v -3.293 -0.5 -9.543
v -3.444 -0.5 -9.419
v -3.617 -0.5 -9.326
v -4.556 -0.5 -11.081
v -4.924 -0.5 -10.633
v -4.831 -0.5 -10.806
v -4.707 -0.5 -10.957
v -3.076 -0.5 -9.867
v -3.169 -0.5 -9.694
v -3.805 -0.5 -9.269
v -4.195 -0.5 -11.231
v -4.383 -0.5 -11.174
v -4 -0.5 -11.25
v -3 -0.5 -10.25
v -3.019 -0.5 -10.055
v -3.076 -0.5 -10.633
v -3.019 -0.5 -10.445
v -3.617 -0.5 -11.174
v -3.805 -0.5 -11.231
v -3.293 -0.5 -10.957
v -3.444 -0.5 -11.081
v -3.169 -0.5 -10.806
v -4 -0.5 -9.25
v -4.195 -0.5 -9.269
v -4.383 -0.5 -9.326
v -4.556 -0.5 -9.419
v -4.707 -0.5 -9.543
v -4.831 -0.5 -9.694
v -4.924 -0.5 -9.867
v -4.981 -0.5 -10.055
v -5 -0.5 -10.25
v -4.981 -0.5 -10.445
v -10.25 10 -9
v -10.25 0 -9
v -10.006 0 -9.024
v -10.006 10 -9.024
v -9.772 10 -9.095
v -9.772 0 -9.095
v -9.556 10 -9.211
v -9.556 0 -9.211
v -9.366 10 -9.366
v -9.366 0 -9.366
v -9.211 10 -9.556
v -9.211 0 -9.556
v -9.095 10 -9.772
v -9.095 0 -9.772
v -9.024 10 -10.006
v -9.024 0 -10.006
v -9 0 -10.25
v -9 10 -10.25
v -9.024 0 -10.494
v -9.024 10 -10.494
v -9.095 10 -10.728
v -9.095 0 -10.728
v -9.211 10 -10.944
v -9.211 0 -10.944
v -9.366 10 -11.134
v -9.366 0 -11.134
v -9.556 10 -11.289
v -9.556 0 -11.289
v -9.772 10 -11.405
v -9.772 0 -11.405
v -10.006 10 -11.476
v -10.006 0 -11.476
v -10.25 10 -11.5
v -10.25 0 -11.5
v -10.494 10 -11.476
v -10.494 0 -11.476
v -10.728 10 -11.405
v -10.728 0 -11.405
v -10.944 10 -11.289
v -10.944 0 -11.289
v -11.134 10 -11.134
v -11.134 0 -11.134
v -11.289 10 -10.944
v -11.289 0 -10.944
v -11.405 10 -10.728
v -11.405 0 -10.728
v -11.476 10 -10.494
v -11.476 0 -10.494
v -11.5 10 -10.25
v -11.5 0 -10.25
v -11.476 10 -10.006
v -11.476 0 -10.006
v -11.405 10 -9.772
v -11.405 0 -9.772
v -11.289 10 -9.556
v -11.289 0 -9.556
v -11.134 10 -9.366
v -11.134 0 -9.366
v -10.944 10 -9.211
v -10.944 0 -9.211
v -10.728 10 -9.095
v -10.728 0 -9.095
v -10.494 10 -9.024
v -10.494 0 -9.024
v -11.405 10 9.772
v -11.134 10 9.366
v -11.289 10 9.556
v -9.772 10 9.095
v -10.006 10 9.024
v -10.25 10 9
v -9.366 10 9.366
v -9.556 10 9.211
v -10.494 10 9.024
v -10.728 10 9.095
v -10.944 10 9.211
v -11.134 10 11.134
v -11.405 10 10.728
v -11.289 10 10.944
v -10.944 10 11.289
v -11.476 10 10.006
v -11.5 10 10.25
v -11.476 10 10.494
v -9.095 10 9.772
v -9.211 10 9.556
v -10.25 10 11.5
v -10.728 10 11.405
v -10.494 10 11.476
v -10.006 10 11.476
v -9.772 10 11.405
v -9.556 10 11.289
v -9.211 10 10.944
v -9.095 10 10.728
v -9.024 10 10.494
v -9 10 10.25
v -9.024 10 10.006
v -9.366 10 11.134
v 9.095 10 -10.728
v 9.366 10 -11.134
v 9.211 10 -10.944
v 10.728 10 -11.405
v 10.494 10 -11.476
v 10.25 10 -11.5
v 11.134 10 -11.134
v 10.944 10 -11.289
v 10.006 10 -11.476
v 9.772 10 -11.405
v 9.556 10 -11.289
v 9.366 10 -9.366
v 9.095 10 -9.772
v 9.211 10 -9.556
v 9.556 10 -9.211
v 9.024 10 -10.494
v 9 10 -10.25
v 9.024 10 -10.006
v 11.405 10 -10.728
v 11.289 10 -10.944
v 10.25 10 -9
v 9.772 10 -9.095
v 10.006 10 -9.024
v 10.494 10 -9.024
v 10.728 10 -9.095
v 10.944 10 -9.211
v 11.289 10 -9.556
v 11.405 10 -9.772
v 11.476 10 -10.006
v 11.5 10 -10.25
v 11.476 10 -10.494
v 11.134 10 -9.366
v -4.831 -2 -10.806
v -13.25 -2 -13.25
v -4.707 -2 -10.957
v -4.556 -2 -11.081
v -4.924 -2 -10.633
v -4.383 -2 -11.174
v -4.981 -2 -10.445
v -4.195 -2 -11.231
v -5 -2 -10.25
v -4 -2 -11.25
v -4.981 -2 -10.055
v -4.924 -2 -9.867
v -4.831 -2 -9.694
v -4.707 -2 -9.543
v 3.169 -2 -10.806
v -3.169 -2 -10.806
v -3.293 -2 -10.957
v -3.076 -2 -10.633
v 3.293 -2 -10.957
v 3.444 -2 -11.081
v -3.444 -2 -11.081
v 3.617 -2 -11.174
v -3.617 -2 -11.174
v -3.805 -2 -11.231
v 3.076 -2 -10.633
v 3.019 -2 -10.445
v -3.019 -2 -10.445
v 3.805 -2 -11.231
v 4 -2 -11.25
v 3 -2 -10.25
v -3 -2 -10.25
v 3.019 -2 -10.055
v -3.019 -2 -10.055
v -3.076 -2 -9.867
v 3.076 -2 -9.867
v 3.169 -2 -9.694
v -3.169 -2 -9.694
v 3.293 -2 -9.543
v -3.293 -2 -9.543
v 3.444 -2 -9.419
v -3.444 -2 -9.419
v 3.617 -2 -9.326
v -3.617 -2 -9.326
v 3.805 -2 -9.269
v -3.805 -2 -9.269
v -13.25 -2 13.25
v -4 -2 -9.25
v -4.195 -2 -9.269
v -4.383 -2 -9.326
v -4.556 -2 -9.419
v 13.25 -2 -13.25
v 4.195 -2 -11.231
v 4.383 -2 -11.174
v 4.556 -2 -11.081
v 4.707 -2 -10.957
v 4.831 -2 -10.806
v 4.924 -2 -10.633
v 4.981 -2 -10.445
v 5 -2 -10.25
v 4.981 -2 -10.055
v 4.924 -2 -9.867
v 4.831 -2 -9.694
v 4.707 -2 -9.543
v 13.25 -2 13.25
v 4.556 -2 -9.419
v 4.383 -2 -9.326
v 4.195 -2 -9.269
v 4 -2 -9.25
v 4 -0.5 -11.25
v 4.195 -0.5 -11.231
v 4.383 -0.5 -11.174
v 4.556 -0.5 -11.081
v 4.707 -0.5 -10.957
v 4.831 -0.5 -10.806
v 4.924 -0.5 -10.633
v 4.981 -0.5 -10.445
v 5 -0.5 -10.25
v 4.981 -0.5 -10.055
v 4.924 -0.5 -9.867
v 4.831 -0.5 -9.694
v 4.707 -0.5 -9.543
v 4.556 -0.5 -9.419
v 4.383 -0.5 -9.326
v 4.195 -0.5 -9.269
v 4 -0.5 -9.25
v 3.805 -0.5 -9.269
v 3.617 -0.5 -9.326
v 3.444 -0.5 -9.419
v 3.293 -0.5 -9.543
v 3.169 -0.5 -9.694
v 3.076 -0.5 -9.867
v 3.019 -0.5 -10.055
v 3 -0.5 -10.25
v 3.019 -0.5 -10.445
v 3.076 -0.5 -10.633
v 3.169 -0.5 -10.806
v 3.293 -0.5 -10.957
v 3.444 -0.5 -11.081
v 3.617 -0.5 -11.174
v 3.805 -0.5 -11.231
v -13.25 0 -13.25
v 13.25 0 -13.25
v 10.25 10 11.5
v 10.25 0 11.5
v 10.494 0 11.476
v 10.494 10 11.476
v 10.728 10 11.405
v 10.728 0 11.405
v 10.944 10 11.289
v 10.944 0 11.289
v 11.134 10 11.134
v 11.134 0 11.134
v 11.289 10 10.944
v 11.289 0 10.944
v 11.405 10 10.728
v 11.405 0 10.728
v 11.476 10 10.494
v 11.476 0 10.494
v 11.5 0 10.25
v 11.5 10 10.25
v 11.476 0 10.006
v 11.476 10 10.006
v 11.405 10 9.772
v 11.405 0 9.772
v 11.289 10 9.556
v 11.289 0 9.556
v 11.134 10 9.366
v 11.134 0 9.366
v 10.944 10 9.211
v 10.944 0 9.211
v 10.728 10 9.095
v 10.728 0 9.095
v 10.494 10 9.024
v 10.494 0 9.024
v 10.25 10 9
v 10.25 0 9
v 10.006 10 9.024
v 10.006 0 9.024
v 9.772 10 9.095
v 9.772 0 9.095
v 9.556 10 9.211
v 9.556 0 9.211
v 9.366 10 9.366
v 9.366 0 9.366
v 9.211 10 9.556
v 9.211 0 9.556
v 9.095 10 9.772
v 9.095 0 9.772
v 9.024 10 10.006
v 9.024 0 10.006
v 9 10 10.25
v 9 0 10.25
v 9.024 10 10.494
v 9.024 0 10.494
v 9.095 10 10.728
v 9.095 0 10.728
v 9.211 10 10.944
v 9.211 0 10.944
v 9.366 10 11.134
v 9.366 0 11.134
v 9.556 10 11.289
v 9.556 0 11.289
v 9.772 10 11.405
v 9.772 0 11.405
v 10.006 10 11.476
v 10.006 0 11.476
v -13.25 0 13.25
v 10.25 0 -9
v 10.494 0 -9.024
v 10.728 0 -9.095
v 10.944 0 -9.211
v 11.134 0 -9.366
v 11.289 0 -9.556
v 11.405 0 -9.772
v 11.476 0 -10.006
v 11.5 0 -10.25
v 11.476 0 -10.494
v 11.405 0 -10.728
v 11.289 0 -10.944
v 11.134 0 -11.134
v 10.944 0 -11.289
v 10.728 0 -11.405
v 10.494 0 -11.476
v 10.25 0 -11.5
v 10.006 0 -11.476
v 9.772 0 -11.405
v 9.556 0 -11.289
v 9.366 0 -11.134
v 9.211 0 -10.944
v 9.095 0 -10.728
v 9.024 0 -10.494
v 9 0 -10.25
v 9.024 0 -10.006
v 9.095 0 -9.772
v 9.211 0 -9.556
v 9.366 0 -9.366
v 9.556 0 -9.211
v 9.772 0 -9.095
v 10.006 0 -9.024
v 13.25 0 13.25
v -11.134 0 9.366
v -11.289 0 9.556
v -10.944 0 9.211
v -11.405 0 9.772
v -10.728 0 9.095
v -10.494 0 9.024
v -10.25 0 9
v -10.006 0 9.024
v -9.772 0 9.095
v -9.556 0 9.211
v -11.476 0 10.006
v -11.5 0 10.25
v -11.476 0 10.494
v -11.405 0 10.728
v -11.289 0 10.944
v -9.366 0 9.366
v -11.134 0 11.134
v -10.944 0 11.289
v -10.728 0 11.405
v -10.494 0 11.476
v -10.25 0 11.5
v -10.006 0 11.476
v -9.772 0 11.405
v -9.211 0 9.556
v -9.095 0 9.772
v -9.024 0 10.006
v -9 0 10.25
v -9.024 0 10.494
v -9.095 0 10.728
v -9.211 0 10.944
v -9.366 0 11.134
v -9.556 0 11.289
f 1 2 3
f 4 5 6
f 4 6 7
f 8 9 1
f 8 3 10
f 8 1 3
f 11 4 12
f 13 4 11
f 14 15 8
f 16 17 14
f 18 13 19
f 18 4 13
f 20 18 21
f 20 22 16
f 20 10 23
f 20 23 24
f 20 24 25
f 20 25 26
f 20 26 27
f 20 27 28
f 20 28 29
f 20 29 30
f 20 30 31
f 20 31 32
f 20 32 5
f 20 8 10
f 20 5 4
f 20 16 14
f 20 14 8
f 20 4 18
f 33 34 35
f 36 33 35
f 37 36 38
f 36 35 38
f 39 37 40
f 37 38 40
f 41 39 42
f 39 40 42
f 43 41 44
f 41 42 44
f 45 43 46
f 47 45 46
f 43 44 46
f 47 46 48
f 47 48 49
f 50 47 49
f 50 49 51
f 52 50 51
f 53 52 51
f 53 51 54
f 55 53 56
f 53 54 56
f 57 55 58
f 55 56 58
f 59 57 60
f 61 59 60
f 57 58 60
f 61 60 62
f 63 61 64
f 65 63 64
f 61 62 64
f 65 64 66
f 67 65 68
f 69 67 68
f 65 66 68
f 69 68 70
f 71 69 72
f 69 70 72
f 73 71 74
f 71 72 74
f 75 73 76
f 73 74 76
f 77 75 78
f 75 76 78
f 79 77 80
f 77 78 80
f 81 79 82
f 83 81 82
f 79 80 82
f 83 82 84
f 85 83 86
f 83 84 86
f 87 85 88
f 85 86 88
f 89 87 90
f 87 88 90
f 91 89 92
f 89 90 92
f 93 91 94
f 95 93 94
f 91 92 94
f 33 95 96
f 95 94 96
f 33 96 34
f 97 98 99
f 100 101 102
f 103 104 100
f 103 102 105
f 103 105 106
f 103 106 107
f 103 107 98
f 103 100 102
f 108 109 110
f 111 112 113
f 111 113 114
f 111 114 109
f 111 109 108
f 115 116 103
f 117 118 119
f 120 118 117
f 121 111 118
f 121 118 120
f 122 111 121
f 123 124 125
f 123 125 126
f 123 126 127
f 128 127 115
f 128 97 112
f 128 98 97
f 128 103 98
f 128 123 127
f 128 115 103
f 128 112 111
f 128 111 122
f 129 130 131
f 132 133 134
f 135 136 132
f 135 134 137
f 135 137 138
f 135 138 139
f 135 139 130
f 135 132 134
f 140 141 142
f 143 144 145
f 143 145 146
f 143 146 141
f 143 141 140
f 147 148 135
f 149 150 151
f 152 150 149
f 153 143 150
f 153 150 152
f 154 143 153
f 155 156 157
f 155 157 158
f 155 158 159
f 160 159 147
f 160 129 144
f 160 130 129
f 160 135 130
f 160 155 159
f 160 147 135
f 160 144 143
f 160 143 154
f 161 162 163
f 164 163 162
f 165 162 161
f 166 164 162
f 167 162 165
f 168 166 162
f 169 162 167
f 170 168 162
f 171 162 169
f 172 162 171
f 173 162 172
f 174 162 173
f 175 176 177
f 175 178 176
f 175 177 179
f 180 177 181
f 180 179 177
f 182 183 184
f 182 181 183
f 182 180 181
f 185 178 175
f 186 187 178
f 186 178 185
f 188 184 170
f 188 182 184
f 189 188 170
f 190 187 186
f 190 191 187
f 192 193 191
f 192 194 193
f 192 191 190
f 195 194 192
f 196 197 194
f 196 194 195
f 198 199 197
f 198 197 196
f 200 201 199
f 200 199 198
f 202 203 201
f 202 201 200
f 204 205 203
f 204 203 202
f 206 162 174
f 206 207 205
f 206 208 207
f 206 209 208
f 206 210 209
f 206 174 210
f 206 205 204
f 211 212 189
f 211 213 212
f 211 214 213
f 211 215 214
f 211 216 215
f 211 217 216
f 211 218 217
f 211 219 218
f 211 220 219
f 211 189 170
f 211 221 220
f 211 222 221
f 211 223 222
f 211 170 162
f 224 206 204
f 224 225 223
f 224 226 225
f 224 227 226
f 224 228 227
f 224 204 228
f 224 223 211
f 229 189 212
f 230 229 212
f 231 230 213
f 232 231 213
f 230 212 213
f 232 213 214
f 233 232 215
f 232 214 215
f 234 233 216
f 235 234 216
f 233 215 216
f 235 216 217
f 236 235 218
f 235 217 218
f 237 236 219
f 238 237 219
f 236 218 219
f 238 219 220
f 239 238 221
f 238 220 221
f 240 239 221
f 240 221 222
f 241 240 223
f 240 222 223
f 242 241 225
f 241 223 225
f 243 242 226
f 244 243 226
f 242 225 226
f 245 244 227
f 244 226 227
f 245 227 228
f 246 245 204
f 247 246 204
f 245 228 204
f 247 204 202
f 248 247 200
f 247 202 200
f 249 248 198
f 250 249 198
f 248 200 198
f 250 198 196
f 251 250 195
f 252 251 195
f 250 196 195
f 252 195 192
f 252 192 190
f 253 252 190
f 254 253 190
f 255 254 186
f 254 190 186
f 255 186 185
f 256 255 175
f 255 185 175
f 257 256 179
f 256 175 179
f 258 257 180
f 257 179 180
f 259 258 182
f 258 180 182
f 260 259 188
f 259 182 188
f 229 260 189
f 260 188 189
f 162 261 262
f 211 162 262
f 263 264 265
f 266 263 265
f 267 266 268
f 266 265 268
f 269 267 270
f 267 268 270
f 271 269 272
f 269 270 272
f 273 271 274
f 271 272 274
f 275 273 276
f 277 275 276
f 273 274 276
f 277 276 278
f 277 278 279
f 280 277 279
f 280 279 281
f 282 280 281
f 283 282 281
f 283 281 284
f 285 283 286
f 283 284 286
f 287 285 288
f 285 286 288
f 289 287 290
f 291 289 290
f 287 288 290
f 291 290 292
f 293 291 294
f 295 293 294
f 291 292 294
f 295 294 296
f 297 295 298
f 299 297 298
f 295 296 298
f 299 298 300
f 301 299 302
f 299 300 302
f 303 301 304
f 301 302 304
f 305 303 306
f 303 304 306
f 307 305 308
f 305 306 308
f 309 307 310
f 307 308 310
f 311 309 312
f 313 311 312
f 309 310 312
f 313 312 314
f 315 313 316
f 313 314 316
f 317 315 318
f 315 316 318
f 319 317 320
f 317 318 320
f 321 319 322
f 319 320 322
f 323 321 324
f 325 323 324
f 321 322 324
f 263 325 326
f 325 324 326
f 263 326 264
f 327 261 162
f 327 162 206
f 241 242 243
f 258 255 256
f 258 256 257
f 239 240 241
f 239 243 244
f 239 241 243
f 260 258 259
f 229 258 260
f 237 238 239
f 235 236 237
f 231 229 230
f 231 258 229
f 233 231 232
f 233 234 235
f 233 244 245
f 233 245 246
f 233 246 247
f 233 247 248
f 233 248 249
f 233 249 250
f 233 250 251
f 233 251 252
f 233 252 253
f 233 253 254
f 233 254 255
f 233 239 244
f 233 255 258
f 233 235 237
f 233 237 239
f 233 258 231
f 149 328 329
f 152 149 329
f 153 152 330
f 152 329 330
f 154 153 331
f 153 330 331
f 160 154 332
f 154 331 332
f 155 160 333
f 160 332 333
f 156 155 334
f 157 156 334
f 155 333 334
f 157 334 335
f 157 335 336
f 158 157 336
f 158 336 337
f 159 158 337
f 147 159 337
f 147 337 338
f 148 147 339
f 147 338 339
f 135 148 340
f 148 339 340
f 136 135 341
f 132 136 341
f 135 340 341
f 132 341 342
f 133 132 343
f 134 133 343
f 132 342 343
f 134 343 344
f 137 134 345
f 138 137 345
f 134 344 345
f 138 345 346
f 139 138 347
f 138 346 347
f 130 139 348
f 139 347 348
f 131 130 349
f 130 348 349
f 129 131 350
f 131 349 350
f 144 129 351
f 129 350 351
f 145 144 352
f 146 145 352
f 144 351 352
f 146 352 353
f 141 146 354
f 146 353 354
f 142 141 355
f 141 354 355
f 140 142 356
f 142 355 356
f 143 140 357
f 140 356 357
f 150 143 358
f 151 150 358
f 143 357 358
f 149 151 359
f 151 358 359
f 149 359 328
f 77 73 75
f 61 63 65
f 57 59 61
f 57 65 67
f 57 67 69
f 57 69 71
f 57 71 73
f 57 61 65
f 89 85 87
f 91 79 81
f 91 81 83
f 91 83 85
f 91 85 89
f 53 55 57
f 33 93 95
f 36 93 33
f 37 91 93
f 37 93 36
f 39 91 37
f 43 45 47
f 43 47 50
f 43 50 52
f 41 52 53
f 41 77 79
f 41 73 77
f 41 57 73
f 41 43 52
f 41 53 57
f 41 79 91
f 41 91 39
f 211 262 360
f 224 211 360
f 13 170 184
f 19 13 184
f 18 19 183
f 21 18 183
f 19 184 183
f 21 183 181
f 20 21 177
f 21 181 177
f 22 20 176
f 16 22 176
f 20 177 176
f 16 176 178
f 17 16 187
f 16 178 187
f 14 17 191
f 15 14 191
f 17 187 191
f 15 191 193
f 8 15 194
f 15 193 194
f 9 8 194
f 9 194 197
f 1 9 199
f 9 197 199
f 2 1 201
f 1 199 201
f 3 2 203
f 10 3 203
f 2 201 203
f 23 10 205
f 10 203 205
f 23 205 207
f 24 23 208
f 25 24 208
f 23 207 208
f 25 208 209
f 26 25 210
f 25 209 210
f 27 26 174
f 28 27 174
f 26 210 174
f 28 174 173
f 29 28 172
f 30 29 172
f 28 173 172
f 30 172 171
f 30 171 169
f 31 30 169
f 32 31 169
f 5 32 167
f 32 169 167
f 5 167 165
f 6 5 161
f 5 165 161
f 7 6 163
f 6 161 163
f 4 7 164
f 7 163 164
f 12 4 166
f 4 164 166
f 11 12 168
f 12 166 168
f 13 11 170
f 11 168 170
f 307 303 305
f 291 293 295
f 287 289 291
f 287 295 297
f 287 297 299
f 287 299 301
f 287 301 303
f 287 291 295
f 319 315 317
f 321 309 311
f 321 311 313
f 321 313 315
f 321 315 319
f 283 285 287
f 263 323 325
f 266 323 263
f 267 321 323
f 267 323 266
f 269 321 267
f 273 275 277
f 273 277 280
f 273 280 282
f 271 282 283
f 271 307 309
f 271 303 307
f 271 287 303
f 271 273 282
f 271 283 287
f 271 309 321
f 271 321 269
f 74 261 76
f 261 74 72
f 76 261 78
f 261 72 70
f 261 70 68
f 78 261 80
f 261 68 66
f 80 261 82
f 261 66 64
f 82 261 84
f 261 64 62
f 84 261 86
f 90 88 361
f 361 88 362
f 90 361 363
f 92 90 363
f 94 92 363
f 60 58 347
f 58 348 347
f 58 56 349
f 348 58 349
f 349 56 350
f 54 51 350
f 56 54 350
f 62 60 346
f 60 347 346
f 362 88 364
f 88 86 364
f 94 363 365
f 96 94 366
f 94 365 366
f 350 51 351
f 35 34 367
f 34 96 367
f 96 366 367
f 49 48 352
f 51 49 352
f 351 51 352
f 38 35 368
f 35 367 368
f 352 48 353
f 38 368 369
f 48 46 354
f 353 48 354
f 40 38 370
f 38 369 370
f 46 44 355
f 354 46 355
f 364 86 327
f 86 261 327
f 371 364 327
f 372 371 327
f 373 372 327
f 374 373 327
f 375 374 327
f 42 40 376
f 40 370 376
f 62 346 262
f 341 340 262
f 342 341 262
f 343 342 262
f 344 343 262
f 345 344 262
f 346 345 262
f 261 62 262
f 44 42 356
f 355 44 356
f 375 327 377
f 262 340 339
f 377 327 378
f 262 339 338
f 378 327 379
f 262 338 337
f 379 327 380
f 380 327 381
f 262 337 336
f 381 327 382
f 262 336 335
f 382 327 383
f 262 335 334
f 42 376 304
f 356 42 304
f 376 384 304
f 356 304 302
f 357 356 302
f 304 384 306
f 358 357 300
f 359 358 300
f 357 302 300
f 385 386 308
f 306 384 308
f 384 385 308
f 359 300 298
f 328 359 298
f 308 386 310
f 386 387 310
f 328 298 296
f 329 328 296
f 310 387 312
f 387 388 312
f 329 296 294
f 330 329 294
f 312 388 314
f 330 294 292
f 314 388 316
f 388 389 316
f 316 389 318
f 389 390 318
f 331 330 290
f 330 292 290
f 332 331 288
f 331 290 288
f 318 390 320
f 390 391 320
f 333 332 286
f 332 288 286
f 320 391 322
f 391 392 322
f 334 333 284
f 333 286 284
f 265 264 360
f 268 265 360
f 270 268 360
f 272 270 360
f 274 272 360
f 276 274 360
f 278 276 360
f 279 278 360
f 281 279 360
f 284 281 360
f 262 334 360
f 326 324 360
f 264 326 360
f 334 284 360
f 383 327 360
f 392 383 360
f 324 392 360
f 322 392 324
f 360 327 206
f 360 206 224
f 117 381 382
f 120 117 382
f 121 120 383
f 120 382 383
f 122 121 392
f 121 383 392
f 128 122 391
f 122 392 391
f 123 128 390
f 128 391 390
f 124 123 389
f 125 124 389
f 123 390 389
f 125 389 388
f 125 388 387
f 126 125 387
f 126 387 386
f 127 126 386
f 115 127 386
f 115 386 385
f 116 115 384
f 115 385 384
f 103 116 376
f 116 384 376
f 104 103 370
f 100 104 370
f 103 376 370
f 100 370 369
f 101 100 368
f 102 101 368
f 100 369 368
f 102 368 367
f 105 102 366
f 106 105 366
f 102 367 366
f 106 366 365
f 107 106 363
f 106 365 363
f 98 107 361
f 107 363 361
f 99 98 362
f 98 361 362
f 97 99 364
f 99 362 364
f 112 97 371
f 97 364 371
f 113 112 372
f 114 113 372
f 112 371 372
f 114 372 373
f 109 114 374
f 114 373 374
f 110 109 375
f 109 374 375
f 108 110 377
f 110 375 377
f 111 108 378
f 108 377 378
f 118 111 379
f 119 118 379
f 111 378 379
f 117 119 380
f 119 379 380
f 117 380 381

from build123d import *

# Parameters (mm, degrees)
SKETCH1_R             = 1.25
BOSS_EXTRUDE1_DEPTH   = 10
BOSS_EXTRUDE1_2_DEPTH = 10
BOSS_EXTRUDE1_3_DEPTH = 10
BOSS_EXTRUDE1_4_DEPTH = 10
SKETCH2_W             = 26.5
SKETCH2_H             = 26.5
BOSS_EXTRUDE2_DEPTH   = 2
SKETCH3_R             = 1
CUT_EXTRUDE1_DEPTH    = 1.5


with BuildPart() as part:
    # Sketch1 → Boss-Extrude1 (new body)
    with BuildSketch(Plane(origin=(0, 0, 0), x_dir=(1, 0, 0), z_dir=(0, 1, 0))):
        with Locations(Location((-10.25, -10.25, 0), (0, 0, 270))):
            Circle(SKETCH1_R)
    extrude(amount=BOSS_EXTRUDE1_DEPTH)



with BuildPart() as body_2:
    # Sketch1 → Boss-Extrude1 2 (new body)
    with BuildSketch(Plane(origin=(0, 0, 0), x_dir=(1, 0, 0), z_dir=(0, 1, 0))):
        with Locations(Location((-10.25, 10.25, 0), (0, 0, 270))):
            Circle(SKETCH1_R)
    extrude(amount=BOSS_EXTRUDE1_2_DEPTH)


with BuildPart() as body_3:
    # Sketch1 → Boss-Extrude1 3 (new body)
    with BuildSketch(Plane(origin=(0, 0, 0), x_dir=(1, 0, 0), z_dir=(0, 1, 0))):
        with Locations(Location((10.25, 10.25, 0), (0, 0, 270))):
            Circle(SKETCH1_R)
    extrude(amount=BOSS_EXTRUDE1_3_DEPTH)


with BuildPart() as body_4:
    # Sketch1 → Boss-Extrude1 4 (new body)
    with BuildSketch(Plane(origin=(0, 0, 0), x_dir=(1, 0, 0), z_dir=(0, 1, 0))):
        with Locations(Location((10.25, -10.25, 0), (0, 0, 270))):
            Circle(SKETCH1_R)
    extrude(amount=BOSS_EXTRUDE1_4_DEPTH)


with BuildPart() as part_1:
    add(part.part)

    add(body_2.part)  # Boss-Extrude2 merges body 2

    add(body_3.part)  # Boss-Extrude2 merges body 3

    add(body_4.part)  # Boss-Extrude2 merges body 4
    # Sketch2 → Boss-Extrude2 (add)
    with BuildSketch(Plane.XZ):
        Rectangle(SKETCH2_W, SKETCH2_H)
    extrude(amount=BOSS_EXTRUDE2_DEPTH)

    # Sketch3 → Cut-Extrude1 (cut)
    with BuildSketch(Plane.XZ.offset(2)):
        with Locations(Location((-4, -10.25, 0), (0, 0, 270))):
            Circle(SKETCH3_R)
        with Locations(Location((4, -10.25, 0), (0, 0, 270))):
            Circle(SKETCH3_R)
    extrude(amount=-CUT_EXTRUDE1_DEPTH, mode=Mode.SUBTRACT)


solid = part_1.part
